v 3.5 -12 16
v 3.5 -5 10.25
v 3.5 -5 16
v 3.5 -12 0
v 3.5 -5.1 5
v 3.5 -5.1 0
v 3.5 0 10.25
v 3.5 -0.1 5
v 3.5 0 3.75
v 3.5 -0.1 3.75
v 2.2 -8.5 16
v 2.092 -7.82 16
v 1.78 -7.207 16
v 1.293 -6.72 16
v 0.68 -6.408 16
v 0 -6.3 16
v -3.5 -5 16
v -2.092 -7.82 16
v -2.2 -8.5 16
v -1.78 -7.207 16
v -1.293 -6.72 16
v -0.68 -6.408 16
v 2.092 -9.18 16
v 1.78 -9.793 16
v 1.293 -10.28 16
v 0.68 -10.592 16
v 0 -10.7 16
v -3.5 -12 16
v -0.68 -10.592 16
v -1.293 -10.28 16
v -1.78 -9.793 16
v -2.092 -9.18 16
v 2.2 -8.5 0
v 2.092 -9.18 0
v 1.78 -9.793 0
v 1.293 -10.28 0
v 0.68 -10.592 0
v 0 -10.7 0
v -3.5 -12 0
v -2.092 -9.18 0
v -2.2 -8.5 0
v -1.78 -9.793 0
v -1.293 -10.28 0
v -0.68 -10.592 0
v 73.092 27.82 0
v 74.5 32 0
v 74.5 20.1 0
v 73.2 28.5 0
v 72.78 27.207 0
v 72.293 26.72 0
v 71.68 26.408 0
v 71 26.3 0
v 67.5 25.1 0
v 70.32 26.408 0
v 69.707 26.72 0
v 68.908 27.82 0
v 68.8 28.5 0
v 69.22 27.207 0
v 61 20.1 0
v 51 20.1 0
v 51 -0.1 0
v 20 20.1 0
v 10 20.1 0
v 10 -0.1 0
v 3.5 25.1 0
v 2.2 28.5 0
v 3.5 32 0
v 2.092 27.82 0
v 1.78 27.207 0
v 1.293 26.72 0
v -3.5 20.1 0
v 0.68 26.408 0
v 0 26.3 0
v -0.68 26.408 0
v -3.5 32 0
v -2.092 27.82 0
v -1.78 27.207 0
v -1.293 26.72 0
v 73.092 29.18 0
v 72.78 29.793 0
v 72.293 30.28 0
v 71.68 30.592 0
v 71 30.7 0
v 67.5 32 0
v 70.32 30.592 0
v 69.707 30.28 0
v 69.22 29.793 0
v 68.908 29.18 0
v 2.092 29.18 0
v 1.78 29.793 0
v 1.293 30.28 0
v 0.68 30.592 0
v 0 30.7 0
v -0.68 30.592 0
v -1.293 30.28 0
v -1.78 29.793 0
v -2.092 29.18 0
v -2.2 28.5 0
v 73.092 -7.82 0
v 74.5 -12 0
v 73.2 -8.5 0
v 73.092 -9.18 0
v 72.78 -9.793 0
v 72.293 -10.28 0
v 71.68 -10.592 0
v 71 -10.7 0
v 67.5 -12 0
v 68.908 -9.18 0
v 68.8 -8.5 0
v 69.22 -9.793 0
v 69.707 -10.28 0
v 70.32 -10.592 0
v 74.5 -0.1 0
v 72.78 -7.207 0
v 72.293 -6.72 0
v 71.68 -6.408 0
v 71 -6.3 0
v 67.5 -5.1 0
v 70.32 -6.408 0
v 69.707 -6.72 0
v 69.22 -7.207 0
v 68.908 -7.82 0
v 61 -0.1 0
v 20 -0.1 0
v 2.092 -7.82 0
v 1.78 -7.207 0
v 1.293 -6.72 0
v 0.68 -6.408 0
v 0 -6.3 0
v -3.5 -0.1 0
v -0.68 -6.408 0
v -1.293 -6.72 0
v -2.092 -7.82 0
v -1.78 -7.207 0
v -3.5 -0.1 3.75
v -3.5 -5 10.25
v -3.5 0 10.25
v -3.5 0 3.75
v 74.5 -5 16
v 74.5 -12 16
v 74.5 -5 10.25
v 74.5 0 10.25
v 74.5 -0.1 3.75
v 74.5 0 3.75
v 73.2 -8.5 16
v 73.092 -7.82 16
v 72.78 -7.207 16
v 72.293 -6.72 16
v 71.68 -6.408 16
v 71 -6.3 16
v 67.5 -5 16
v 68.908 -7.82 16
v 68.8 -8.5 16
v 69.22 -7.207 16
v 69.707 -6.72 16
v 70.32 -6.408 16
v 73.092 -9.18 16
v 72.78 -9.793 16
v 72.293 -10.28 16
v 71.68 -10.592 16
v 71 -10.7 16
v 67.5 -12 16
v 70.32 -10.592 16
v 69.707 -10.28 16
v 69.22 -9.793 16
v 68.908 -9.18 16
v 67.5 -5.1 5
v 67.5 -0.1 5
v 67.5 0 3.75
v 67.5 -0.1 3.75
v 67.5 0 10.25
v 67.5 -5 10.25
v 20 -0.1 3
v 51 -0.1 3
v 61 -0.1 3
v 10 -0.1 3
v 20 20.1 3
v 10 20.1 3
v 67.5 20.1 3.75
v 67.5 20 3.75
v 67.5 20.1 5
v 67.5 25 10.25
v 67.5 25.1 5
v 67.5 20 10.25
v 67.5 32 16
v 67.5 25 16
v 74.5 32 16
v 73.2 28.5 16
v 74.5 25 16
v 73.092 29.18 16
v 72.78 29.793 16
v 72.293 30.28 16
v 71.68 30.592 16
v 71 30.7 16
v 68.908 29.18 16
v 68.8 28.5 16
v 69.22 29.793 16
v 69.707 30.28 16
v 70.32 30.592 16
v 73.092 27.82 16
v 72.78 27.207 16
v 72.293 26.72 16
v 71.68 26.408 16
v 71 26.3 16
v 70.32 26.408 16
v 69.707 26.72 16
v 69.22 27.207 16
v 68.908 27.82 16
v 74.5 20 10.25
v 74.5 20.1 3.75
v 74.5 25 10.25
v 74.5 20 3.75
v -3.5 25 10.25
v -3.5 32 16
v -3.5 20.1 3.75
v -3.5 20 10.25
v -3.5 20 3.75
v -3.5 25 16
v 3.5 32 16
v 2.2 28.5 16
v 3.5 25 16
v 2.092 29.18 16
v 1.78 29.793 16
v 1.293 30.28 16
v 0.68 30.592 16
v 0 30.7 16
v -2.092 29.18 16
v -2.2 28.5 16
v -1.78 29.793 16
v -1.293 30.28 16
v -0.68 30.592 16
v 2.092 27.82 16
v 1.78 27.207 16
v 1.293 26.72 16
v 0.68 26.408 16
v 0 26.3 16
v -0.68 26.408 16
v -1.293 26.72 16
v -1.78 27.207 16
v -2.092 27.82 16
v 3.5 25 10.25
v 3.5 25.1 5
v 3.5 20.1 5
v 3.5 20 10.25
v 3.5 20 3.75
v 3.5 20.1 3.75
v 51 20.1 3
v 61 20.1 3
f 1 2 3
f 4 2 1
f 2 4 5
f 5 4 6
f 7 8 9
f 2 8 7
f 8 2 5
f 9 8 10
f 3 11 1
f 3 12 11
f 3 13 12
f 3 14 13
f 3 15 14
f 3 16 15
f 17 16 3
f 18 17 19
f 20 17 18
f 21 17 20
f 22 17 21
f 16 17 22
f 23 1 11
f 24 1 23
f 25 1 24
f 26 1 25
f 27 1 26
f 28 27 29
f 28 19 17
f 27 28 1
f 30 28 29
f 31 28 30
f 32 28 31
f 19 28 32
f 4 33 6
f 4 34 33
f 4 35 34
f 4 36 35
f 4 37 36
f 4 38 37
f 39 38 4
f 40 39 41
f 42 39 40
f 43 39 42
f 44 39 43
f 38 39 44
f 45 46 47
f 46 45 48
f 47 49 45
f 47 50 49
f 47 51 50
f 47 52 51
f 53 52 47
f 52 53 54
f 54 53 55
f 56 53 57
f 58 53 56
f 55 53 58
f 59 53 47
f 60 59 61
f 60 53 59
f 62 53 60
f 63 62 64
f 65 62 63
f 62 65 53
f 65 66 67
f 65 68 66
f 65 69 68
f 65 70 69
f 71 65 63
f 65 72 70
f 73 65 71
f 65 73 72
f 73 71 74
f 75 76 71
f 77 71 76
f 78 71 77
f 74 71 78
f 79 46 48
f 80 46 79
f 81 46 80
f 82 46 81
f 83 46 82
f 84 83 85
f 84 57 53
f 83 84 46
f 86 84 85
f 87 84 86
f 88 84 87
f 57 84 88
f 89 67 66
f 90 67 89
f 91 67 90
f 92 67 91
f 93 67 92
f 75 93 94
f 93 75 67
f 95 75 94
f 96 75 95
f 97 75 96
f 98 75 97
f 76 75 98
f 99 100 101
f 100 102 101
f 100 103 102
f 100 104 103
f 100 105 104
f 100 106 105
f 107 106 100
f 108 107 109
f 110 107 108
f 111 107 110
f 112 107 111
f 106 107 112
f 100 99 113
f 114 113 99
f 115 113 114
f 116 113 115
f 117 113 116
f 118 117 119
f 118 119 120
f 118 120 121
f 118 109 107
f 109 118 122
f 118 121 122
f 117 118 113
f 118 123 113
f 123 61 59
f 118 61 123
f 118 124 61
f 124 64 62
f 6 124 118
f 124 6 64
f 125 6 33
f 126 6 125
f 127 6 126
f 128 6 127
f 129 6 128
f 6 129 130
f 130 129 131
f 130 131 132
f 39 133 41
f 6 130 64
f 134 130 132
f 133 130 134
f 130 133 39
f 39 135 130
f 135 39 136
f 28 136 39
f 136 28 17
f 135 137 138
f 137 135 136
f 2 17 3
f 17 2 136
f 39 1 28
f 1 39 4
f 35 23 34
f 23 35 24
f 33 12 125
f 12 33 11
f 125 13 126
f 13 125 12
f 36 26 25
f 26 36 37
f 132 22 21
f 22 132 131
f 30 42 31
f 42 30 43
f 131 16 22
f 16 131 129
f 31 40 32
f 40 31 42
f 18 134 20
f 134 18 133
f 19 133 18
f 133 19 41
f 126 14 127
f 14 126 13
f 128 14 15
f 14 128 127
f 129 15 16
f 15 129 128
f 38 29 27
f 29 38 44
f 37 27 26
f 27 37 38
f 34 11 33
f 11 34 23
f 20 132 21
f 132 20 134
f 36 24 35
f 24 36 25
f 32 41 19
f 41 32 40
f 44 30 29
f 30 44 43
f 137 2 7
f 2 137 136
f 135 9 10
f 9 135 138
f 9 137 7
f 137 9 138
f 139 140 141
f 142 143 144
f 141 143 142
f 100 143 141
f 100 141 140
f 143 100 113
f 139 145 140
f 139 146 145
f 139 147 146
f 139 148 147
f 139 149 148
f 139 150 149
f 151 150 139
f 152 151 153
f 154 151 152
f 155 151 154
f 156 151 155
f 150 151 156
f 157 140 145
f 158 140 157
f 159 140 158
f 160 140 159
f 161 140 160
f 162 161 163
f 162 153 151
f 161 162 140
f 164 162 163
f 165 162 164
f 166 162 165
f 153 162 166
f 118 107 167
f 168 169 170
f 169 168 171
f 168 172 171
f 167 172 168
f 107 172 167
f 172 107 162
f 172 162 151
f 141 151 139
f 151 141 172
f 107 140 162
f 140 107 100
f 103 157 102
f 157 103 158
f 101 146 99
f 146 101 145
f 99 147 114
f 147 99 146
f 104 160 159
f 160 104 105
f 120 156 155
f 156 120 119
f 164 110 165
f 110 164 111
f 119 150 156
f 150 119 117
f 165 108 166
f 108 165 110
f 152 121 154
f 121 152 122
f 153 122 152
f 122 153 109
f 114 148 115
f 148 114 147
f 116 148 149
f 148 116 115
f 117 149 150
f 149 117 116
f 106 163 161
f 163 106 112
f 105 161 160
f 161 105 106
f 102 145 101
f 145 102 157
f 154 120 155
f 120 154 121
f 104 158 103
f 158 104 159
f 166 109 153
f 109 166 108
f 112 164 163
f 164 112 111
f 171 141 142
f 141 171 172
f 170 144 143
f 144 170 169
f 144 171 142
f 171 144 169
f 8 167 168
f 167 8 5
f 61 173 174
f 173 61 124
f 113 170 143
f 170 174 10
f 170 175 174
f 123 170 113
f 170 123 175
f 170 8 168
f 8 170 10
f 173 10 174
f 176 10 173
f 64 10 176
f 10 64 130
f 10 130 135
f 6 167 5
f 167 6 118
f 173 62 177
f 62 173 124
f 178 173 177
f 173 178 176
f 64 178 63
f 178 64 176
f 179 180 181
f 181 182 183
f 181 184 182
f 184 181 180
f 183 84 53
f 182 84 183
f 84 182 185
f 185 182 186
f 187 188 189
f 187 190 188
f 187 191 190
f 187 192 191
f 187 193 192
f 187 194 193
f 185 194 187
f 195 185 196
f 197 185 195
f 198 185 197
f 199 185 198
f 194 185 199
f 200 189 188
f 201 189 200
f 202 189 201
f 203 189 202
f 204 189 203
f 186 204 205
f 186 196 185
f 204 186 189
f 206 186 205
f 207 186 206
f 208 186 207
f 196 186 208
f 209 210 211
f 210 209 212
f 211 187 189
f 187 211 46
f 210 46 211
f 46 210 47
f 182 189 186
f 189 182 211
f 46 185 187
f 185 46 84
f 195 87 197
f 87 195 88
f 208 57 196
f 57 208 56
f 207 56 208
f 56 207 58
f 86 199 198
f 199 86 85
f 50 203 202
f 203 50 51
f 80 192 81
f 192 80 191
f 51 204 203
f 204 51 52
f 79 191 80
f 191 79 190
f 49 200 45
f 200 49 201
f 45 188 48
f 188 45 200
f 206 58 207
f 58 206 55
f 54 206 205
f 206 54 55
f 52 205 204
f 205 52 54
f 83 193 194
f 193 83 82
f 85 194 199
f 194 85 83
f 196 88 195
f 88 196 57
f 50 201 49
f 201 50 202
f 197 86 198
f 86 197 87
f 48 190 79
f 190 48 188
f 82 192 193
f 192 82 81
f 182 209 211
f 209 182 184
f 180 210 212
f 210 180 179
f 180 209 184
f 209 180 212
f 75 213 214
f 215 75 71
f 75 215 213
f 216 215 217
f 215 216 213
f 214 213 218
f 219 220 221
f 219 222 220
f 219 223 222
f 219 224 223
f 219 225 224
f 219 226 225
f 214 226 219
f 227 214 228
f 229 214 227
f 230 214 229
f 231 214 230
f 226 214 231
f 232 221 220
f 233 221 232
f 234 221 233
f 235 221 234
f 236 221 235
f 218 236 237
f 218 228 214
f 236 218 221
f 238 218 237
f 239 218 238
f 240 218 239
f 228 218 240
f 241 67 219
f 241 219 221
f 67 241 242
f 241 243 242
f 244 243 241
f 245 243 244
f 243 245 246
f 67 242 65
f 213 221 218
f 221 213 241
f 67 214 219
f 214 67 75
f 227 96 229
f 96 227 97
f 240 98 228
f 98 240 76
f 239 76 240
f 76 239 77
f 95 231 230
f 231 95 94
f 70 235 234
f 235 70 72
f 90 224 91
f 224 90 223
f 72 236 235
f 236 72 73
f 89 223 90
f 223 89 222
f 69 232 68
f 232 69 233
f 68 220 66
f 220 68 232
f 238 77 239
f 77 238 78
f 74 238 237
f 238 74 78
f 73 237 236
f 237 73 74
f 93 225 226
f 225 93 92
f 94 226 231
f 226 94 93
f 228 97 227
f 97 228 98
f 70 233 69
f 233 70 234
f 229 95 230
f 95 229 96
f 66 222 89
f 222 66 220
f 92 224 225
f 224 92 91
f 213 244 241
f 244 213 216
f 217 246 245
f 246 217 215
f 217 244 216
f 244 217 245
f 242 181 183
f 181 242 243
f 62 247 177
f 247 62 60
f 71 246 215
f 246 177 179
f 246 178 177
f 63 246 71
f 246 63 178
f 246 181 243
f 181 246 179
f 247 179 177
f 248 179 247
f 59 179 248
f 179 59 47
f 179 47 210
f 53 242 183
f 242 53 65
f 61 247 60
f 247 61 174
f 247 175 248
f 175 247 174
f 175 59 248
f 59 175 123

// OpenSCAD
module schraubBlock() {
	difference() {
		translate([0,0,8])
		cube(center=true,[7,7,16]);
		translate([0,0,-1])
		cylinder(h=18,r=2.2,$fn=20);
	}
}

module strebe() {
	translate([-3.5,3.4,0])
	cube([78,5,5]);
}

module Stabilisierung() {
	translate([0,5.5,7])
	cube(center=true,[7,6,6.5]);
}

module LuefterHalter() {
	union() {
	union() {
		Stabilisierung();
		schraubBlock();
	}	
	translate([71,0,0])
	union() {
		Stabilisierung();
		schraubBlock();
	}
	strebe();
	}
}

module KlemmeFeder() {
	translate([10,-5,0])
	cube([10,30,3]);
}

module Haelfte() {
		union() {
			translate([0,-8.5,0])
			LuefterHalter();
			KlemmeFeder();
	}
}

module Komplett() {
	union() {
		Haelfte();
		rotate([0,0,180])
		translate([-71,-20,0])
		Haelfte();
	}
}

Komplett();
